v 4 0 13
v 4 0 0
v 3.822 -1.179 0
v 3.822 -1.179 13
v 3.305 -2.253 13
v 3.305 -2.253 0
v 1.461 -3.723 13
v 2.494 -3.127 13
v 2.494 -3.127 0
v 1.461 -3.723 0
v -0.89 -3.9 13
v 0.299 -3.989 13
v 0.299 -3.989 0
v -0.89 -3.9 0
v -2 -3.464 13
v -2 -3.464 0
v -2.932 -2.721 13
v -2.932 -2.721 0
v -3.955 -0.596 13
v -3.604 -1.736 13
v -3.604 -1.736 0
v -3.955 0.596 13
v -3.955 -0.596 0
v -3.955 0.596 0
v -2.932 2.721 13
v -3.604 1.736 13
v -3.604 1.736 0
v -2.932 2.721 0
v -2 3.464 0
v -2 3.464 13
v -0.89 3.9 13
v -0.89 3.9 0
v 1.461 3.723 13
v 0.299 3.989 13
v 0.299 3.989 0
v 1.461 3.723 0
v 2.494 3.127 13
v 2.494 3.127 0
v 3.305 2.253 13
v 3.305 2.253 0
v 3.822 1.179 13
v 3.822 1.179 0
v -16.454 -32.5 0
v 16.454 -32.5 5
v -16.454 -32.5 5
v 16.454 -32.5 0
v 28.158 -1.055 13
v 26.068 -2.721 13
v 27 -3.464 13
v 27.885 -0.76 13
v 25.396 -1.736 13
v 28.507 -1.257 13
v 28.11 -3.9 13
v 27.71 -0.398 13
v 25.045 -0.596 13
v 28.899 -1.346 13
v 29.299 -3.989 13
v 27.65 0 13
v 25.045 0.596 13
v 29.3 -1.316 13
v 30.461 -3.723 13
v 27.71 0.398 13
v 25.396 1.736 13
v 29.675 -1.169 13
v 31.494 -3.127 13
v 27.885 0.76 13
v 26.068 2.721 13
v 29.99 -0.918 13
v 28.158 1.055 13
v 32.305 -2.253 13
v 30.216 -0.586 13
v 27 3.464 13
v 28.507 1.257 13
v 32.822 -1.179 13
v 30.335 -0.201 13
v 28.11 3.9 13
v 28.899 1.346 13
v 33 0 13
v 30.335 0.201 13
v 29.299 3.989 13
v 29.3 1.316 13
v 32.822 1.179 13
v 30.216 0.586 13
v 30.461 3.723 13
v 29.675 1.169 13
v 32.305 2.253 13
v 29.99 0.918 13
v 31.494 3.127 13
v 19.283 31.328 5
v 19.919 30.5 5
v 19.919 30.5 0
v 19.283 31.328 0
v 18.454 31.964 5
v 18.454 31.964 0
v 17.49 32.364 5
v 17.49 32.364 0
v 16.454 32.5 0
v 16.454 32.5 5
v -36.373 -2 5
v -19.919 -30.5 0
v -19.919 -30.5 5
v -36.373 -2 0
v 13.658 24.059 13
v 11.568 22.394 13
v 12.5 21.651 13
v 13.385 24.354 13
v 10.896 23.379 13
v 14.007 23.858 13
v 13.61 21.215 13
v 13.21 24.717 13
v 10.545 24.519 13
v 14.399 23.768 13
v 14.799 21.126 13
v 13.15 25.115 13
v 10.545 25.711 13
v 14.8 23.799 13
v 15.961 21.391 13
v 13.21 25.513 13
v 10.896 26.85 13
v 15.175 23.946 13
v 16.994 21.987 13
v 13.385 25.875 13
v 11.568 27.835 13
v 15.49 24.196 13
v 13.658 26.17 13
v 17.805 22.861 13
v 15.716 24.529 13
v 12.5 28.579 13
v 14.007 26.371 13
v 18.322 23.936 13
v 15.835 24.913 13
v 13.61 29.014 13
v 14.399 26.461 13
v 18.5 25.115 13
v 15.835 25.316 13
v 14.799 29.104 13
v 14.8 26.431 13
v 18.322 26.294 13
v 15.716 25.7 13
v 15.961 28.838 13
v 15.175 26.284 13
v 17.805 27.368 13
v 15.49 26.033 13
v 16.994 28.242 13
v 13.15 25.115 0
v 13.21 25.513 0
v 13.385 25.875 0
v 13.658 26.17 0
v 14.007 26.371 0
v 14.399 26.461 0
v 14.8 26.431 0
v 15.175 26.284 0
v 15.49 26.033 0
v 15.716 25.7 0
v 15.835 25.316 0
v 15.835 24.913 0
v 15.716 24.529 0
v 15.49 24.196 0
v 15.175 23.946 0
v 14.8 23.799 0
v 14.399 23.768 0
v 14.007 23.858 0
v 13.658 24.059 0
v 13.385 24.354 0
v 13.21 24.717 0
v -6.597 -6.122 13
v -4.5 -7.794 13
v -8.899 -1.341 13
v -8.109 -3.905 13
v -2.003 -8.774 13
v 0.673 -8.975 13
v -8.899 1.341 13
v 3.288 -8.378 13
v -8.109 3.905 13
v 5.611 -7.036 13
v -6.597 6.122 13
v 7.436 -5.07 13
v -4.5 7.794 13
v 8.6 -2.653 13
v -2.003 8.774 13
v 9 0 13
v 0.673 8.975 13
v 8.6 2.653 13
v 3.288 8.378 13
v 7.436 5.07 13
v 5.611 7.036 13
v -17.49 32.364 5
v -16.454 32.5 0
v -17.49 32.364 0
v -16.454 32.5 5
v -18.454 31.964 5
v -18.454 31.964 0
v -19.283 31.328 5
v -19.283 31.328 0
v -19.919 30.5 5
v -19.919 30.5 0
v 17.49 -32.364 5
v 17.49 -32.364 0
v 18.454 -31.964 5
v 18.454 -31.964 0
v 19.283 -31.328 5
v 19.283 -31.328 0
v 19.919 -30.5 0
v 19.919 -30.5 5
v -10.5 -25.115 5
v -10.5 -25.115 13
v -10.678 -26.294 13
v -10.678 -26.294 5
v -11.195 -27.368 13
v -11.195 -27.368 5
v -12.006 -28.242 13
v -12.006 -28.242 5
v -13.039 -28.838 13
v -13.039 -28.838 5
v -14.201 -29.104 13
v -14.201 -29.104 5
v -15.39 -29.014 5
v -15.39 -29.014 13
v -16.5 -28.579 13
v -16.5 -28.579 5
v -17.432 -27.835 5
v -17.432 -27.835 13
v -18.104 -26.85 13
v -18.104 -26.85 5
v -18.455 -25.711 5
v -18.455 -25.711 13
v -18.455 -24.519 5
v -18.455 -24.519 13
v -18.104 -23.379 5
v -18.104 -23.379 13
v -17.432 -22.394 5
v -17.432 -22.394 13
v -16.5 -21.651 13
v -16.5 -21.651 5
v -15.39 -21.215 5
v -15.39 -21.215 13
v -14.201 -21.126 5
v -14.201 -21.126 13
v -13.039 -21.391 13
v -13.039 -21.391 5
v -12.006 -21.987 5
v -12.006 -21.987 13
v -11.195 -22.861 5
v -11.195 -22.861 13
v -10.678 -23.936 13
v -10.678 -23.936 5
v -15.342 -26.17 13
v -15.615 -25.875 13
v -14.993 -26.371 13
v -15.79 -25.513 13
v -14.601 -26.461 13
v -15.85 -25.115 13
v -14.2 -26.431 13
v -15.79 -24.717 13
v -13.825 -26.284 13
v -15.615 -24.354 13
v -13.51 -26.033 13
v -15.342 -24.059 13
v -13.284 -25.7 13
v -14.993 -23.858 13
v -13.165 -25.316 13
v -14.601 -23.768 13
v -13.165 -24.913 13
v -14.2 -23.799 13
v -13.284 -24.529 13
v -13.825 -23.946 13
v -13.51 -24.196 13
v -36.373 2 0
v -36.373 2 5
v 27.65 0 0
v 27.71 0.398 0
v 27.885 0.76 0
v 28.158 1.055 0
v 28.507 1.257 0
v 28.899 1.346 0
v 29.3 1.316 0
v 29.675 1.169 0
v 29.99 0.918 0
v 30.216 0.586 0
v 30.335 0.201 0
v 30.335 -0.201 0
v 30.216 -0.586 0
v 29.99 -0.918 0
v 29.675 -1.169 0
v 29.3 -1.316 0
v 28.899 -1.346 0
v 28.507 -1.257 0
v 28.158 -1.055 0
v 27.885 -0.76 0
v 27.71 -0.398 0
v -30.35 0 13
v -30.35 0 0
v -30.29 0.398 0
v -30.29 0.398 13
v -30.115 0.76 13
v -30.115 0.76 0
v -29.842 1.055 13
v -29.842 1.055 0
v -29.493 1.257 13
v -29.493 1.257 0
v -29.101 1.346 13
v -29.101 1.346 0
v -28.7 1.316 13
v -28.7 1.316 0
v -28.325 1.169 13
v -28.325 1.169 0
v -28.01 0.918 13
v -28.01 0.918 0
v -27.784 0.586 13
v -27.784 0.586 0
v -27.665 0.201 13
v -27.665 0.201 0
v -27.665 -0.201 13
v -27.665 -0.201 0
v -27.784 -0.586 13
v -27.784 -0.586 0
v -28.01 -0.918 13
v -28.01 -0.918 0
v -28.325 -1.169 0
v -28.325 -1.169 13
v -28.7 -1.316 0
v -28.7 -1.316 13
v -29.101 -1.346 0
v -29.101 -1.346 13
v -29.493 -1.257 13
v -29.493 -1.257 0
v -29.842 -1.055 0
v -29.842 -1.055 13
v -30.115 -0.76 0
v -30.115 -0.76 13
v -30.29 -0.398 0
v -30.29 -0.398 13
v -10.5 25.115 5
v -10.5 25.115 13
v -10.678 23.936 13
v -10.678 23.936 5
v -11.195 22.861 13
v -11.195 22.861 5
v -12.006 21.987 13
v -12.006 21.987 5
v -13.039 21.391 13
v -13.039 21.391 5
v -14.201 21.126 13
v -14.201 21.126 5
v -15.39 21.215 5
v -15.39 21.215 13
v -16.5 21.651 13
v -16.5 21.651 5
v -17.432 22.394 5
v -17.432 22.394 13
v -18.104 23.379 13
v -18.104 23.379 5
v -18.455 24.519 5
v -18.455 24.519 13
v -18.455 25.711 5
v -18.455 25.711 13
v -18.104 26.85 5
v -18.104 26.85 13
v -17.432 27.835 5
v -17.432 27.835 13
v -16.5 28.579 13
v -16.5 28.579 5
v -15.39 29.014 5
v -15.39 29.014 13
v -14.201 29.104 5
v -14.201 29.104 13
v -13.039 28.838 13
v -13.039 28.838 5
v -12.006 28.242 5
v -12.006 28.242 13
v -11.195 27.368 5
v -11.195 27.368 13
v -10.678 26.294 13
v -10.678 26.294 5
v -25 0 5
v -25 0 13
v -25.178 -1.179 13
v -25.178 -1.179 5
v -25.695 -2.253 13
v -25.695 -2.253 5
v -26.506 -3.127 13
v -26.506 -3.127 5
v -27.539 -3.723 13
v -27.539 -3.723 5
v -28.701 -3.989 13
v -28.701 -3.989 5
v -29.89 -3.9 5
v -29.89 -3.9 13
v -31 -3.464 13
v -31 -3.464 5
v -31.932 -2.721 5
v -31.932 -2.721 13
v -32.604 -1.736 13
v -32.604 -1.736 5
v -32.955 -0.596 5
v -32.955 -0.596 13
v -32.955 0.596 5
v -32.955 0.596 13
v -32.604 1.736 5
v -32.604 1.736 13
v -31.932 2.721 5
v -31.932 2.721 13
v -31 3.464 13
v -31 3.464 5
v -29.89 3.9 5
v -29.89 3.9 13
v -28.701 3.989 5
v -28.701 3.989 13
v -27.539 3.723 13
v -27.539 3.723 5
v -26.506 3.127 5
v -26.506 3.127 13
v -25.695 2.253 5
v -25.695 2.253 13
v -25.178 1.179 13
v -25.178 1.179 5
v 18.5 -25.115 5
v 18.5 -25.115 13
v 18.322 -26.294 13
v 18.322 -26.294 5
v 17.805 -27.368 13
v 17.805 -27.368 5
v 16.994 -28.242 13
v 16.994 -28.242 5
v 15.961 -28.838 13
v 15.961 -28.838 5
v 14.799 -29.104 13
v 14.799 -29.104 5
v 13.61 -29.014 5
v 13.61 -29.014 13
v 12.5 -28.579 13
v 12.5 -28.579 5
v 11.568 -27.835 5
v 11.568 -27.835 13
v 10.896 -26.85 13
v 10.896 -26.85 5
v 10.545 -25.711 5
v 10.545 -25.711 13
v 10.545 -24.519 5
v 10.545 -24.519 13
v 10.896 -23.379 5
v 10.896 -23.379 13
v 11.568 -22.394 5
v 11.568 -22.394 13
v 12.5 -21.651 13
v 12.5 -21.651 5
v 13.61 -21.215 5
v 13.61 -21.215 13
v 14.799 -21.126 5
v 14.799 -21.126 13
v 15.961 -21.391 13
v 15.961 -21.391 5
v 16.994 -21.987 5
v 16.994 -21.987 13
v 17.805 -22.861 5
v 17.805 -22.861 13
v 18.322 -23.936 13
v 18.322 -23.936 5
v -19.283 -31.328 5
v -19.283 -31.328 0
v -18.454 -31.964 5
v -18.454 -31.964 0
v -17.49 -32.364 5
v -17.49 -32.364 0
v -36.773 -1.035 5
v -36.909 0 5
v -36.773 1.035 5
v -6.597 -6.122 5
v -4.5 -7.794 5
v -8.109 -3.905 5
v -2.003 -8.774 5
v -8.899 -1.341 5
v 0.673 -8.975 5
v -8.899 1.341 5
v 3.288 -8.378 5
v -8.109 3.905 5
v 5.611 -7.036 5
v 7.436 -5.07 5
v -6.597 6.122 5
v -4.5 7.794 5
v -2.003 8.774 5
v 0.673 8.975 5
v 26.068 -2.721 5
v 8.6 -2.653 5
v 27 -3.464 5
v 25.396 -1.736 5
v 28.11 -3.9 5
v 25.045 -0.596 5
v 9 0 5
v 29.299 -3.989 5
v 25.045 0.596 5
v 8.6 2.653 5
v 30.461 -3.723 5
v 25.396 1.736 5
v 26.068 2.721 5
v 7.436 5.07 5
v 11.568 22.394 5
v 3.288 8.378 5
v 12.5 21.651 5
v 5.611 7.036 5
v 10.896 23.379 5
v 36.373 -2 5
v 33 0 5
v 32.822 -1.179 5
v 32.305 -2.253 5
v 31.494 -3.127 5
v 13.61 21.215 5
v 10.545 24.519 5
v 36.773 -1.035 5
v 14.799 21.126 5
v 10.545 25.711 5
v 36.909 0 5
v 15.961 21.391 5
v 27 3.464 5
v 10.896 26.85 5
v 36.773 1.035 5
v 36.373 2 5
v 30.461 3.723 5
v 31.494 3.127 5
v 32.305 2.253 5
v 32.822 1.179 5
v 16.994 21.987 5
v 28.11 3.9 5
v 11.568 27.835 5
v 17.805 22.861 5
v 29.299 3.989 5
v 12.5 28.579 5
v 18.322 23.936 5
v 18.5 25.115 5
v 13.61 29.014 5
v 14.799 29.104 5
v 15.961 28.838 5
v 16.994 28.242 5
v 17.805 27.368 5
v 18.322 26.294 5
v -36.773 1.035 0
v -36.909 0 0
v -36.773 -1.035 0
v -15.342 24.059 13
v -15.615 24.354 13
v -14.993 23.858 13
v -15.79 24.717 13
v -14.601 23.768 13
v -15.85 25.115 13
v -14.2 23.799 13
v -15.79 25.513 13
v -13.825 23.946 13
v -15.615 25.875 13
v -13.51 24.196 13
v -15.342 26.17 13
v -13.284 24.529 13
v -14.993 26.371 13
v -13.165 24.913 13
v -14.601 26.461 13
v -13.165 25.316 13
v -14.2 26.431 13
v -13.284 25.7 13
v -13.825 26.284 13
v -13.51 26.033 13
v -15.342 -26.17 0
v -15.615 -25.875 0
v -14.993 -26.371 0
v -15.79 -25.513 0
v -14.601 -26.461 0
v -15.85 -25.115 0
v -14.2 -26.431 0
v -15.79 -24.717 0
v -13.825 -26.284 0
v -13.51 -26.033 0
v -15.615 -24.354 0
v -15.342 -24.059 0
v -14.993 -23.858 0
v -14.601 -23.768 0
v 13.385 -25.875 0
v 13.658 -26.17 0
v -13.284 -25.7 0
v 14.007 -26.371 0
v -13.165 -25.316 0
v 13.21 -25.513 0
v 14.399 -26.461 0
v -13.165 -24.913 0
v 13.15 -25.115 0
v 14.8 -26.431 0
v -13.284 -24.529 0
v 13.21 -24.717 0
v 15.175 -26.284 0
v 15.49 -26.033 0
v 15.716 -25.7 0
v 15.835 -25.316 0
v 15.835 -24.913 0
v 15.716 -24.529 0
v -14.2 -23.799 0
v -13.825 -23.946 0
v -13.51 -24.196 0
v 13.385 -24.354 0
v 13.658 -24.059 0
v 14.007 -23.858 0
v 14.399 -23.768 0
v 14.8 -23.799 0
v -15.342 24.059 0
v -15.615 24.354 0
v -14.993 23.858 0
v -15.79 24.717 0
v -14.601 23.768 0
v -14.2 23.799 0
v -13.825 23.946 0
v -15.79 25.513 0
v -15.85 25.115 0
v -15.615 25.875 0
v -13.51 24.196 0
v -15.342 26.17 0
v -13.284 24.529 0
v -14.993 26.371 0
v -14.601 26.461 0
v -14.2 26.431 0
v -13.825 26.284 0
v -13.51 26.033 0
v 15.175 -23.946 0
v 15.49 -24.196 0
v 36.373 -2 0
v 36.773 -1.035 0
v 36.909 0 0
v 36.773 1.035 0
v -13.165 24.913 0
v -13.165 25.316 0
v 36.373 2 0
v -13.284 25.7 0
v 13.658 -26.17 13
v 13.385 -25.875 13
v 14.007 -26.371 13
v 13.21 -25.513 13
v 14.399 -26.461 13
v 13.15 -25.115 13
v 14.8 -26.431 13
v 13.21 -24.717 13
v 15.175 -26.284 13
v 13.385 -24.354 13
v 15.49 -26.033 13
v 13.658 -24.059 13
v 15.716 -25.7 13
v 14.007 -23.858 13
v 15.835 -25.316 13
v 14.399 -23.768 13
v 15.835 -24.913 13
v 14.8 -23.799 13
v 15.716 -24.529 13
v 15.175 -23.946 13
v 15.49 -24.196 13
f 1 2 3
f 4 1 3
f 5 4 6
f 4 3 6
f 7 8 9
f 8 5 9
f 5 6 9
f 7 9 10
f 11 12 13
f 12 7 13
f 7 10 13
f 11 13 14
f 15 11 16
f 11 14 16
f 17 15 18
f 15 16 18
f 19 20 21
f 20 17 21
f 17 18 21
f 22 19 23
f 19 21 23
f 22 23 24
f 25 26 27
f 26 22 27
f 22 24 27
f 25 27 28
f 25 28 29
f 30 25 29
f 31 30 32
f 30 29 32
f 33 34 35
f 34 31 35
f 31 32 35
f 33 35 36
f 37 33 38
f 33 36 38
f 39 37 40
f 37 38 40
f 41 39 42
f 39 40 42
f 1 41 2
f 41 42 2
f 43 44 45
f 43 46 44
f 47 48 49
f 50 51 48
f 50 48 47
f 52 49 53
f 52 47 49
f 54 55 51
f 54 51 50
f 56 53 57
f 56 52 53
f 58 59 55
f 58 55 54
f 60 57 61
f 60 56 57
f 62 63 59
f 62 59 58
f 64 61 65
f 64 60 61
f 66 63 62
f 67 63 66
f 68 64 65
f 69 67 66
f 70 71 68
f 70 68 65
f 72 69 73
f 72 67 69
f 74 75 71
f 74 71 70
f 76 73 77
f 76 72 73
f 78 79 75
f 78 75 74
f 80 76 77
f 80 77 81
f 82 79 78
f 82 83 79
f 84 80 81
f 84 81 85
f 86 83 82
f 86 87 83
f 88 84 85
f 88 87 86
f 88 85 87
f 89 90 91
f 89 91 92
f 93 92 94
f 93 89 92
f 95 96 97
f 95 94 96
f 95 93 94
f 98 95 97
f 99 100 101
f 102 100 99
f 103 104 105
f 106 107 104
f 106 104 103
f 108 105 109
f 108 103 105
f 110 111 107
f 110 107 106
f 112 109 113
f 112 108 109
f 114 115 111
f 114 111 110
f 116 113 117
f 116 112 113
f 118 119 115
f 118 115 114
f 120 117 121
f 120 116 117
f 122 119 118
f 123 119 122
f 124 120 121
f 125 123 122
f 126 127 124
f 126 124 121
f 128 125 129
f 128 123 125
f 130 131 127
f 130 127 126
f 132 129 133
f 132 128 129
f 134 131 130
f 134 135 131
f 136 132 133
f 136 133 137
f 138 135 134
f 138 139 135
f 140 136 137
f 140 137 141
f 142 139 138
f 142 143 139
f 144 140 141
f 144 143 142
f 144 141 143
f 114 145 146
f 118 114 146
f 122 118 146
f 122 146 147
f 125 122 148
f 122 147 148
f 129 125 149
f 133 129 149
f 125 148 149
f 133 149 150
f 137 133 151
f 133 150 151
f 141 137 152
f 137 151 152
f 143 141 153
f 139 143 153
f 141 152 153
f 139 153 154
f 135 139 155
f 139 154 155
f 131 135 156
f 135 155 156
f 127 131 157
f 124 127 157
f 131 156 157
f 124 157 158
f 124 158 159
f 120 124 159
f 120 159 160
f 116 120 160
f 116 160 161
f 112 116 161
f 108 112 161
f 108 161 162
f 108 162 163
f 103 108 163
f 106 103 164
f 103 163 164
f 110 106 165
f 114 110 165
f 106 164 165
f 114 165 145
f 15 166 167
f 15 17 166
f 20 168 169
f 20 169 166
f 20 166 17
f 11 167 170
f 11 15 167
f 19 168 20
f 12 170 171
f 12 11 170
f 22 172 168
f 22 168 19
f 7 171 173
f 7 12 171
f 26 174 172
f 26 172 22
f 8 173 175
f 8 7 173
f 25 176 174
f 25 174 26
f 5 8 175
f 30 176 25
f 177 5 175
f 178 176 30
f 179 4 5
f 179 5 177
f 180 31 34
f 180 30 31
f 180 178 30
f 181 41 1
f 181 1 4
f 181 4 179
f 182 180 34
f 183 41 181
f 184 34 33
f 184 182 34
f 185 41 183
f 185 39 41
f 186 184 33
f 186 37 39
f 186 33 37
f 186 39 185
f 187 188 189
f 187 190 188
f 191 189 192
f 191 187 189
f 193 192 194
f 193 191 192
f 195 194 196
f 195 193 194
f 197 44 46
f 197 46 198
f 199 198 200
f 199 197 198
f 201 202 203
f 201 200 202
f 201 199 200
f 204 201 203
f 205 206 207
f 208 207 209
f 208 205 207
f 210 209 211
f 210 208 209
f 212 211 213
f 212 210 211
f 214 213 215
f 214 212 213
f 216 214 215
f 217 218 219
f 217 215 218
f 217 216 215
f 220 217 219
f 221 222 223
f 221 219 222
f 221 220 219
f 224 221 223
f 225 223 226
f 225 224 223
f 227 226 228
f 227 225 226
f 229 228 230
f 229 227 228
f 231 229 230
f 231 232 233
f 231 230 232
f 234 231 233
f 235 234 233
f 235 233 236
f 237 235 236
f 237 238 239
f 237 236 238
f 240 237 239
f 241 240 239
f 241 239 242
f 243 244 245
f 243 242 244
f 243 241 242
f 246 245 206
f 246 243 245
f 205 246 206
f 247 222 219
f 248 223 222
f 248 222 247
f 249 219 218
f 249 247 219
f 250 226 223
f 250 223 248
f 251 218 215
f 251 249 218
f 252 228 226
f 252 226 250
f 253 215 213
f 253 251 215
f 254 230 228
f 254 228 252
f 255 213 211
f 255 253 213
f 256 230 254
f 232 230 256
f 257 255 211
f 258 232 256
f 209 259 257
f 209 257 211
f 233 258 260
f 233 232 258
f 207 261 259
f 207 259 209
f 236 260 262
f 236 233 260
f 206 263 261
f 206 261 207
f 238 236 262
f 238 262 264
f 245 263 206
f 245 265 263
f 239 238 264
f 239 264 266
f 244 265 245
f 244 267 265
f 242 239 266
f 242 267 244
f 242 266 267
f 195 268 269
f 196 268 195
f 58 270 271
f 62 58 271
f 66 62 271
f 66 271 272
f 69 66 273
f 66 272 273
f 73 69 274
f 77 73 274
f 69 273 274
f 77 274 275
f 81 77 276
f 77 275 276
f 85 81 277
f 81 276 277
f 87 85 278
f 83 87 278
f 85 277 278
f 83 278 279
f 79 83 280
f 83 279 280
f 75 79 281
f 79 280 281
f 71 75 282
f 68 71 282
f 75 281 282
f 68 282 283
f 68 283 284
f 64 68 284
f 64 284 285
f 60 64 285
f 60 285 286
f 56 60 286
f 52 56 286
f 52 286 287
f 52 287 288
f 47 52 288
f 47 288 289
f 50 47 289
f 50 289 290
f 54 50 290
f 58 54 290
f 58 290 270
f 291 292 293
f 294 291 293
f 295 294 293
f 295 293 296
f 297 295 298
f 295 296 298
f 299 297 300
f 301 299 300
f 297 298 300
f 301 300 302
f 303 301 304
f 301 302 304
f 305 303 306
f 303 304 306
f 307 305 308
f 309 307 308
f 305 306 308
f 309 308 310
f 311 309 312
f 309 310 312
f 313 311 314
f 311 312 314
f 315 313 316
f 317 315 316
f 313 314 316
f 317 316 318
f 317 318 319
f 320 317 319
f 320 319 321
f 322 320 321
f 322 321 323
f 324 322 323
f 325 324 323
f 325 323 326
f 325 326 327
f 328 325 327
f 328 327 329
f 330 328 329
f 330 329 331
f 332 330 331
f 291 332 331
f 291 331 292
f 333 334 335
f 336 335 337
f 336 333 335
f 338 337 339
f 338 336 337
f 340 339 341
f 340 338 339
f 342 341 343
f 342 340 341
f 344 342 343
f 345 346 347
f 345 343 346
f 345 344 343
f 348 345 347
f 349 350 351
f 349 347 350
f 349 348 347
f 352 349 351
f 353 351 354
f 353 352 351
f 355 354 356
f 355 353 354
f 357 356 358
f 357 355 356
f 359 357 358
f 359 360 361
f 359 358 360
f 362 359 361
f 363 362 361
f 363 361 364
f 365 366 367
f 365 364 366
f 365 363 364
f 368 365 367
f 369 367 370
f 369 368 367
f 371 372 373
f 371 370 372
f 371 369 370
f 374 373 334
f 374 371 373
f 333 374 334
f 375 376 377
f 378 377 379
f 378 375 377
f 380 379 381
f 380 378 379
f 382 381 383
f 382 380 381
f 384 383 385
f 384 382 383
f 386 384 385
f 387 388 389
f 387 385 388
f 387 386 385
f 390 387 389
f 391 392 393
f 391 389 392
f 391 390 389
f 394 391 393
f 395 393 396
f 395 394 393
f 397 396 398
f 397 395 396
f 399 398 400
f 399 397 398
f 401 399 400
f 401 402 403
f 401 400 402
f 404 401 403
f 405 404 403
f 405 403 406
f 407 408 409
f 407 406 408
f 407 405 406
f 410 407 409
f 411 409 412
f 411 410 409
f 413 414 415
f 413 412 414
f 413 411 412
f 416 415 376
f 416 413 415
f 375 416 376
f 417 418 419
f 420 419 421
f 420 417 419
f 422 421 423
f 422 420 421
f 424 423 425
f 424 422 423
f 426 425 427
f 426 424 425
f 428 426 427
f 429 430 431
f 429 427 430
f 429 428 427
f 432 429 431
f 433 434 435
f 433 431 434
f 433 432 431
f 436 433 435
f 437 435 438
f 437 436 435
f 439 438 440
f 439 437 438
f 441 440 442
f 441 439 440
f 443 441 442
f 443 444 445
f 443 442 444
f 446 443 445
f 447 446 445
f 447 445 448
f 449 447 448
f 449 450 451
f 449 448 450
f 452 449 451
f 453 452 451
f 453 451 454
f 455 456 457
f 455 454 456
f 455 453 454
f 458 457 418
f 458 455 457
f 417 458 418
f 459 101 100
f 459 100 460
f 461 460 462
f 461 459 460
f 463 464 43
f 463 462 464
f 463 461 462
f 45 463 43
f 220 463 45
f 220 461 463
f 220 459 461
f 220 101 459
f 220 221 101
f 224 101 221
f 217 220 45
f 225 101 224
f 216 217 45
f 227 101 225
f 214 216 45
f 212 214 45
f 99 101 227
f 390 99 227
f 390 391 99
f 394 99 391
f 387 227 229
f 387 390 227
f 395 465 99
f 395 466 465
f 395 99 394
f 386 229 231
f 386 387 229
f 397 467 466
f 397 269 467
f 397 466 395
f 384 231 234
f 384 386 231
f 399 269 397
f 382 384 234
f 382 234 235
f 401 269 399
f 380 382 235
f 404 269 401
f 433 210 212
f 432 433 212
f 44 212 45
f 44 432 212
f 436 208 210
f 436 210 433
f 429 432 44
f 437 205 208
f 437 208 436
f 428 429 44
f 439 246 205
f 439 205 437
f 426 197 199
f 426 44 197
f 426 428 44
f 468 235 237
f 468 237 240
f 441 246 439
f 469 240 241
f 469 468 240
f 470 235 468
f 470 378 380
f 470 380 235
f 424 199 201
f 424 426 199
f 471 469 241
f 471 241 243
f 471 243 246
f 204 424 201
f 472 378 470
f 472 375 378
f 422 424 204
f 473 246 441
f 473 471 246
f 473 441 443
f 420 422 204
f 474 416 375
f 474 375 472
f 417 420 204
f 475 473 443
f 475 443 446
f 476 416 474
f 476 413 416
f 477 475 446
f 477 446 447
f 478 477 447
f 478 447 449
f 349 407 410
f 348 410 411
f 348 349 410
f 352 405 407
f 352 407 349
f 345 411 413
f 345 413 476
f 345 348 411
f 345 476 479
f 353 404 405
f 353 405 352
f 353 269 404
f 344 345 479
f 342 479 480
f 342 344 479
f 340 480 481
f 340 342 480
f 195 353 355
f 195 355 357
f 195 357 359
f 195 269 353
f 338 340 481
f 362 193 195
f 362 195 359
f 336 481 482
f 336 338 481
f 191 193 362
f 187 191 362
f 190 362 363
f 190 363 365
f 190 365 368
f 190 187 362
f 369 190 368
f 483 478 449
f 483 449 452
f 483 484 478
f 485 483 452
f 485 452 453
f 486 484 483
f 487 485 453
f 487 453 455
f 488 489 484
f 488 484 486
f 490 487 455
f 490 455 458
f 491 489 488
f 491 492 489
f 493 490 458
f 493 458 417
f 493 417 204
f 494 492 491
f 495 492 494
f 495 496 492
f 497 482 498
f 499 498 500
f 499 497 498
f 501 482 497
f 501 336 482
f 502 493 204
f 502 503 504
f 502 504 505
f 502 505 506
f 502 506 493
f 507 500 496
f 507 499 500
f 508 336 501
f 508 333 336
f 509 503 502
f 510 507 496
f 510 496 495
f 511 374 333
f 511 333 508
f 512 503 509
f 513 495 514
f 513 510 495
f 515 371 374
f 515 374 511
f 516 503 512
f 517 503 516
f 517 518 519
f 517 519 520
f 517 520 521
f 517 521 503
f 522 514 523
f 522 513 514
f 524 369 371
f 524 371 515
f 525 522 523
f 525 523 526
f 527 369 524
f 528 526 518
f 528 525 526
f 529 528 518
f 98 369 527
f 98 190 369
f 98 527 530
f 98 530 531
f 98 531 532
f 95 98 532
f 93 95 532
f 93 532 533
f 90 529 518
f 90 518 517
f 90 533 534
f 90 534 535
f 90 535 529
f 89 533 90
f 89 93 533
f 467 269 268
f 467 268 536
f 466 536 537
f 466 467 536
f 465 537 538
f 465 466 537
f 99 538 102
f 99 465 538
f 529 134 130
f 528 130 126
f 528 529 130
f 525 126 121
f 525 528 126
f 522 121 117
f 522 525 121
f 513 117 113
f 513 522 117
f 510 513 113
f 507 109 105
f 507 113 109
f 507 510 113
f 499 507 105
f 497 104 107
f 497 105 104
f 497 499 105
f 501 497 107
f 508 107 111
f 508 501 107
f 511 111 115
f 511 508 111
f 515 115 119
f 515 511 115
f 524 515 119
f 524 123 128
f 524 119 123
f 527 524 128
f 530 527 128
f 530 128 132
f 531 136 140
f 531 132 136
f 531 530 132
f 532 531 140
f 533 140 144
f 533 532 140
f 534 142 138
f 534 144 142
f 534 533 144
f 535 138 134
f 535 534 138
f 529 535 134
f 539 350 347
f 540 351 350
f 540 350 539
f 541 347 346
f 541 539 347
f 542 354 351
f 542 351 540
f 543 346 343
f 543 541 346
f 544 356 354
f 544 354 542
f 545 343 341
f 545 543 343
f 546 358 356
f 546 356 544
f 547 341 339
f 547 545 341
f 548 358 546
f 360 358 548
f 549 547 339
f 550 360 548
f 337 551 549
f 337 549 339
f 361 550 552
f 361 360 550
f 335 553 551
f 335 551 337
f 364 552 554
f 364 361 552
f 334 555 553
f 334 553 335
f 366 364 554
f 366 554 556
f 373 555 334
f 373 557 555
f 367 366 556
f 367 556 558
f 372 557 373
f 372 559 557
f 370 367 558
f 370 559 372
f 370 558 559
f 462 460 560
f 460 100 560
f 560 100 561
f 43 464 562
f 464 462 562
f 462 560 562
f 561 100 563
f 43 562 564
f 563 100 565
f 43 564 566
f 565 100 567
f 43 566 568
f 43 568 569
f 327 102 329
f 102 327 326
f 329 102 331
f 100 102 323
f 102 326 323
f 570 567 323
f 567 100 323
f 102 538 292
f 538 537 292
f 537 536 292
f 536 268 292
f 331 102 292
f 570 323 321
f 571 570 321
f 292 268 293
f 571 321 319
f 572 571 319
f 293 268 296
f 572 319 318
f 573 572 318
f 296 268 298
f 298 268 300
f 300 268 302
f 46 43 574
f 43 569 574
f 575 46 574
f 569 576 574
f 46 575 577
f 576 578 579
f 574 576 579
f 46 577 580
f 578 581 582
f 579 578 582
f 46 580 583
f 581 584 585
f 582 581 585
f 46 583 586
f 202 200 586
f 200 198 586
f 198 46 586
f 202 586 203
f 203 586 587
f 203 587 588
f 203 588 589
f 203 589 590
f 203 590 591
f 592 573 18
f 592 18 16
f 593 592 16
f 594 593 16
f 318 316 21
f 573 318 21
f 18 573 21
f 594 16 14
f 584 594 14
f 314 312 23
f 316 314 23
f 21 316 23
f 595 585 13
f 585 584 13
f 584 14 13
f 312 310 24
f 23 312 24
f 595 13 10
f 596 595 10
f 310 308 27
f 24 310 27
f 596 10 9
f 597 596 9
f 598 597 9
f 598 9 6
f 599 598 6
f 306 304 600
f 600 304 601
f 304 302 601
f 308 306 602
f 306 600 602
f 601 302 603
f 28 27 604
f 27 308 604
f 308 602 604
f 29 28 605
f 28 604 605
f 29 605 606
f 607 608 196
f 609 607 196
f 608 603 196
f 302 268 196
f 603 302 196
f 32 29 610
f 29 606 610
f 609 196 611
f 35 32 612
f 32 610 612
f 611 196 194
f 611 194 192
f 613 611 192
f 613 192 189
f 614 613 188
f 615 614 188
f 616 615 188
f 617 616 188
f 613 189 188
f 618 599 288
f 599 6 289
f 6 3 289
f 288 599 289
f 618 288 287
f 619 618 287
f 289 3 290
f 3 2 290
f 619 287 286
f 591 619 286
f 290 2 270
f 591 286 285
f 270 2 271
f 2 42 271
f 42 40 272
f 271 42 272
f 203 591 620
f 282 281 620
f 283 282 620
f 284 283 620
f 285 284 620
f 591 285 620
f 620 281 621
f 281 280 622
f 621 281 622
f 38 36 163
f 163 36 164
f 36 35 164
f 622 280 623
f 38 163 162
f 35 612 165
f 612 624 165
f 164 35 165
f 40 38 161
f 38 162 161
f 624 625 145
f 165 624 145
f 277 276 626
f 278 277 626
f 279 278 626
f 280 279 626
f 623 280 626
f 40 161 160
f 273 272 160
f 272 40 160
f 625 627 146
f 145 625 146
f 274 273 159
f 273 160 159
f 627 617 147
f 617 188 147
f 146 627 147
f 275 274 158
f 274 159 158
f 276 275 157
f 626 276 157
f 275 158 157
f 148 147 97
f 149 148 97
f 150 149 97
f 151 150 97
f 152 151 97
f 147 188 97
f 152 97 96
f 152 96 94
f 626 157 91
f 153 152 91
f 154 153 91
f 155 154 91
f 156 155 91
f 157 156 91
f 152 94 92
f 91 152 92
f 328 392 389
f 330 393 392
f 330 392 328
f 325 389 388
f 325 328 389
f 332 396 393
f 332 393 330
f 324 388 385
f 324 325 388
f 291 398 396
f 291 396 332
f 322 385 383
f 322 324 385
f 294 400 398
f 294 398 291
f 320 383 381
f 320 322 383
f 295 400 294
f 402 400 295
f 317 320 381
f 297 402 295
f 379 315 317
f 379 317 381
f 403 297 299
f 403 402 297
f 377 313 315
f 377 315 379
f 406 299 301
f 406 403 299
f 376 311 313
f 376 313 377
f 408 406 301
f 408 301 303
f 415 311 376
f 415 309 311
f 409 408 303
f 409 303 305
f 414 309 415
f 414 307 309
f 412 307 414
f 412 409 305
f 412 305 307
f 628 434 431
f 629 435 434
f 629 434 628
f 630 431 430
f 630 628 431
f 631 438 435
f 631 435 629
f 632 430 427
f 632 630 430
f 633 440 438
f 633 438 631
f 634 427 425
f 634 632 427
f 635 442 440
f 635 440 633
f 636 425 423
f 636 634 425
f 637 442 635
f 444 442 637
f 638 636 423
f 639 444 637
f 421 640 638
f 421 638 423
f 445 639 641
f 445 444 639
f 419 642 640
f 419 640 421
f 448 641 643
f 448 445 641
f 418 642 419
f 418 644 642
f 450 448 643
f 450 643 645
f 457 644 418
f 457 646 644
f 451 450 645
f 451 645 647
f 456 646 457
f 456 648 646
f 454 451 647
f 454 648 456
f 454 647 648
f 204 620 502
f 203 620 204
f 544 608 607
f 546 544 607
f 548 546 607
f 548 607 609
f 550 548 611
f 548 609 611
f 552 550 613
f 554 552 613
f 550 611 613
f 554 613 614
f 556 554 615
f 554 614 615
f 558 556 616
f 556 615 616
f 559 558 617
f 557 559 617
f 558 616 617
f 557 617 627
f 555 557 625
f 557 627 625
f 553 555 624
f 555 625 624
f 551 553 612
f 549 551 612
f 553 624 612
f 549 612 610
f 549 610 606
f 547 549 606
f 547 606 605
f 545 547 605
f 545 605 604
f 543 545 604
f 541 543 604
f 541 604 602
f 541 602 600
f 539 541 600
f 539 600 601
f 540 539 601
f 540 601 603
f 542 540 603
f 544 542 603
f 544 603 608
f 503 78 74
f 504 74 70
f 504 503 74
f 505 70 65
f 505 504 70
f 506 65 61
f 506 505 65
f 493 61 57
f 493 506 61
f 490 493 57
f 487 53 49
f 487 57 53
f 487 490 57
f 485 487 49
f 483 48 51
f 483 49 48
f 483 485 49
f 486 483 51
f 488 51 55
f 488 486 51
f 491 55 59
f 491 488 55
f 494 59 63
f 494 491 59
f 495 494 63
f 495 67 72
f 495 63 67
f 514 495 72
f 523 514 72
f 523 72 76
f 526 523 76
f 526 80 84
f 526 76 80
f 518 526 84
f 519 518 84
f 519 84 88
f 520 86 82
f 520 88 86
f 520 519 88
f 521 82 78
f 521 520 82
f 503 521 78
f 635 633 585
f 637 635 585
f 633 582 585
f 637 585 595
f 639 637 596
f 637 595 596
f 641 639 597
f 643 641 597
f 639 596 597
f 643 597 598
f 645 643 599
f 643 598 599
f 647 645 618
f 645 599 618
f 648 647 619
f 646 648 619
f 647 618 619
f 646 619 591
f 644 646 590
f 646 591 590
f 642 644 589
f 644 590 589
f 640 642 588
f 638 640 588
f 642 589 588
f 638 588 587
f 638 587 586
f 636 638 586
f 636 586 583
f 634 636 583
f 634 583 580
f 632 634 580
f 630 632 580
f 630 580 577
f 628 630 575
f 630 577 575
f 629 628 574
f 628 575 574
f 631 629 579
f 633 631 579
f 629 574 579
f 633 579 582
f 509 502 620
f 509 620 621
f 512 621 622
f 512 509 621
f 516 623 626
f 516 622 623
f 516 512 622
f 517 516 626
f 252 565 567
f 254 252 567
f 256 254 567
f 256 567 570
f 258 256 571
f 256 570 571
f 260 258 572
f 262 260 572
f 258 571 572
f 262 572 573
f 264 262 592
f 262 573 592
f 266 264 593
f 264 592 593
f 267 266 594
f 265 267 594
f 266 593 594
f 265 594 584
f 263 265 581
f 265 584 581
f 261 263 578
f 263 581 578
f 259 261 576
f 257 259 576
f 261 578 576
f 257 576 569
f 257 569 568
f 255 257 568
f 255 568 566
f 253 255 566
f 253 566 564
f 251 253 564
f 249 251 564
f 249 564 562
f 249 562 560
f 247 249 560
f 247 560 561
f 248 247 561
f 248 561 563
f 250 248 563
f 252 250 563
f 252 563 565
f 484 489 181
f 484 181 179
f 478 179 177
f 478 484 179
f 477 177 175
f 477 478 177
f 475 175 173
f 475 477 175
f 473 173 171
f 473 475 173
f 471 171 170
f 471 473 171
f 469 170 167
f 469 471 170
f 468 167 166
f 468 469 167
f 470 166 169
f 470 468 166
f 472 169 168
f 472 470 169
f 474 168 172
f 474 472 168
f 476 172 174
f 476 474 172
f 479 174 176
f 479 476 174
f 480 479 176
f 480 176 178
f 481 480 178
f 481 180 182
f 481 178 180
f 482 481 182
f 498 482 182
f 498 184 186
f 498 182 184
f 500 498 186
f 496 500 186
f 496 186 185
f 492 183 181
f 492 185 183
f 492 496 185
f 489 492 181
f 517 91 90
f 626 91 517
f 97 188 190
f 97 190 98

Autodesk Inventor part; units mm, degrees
ref_plane "YZ Plane" through (0, 0, 0) normal (1, 0, 0) x (0, 1, 0)
ref_plane "XZ Plane" through (0, 0, 0) normal (0, 1, 0) x (-1, 0, 0)
ref_plane "XY Plane" through (0, 0, 0) normal (0, 0, 1) x (1, 0, 0)
sketch "Sketch1" plane through (0, 0, 0) normal (0, 0, 1) x (1, 0, 0)
  line L0 (-14.5, 25.1147) -> (14.5, 25.1147) construction
  line L1 (14.5, 25.1147) -> (29, 0) construction
  line L2 (29, 0) -> (14.5, -25.1147) construction
  line L3 (14.5, -25.1147) -> (-14.5, -25.1147) construction
  line L4 (-14.5, -25.1147) -> (-29, 0) construction
  line L5 (-29, 0) -> (-14.5, 25.1147) construction
  line L6 (-18.7639, 32.5) -> (18.7639, 32.5)
  line L7 (18.7639, 32.5) -> (37.5278, 0)
  line L8 (37.5278, 0) -> (18.7639, -32.5)
  line L9 (18.7639, -32.5) -> (-18.7639, -32.5)
  line L10 (-18.7639, -32.5) -> (-37.5278, 0)
  line L11 (-37.5278, 0) -> (-18.7639, 32.5)
  circle A0 centre (-14.5, 25.1147) radius 11 construction
  circle A1 centre (14.5, 25.1147) radius 11 construction
  circle A2 centre (29, 0) radius 11 construction
  circle A3 centre (14.5, -25.1147) radius 11 construction
  circle A4 centre (-14.5, -25.1147) radius 11 construction
  circle A5 centre (-29, 0) radius 11 construction
  circle A6 centre (-14.5, 25.1147) radius 4
  circle A7 centre (14.5, 25.1147) radius 4
  circle A8 centre (29, 0) radius 4
  circle A9 centre (14.5, -25.1147) radius 4
  circle A10 centre (-14.5, -25.1147) radius 4
  circle A11 centre (-29, 0) radius 4
  circle A12 centre (0, 0) radius 4
  circle A13 centre (0, 0) radius 40 construction
  circle A14 centre (0, 0) radius 37.5278 construction
  dimension "d17" = 75.0555
  dimension "d0" = 22
  dimension "d1" = 50.2295
  dimension "d2" = 8
  dimension "d3" = 65
  dimension "d4" = 8
  dimension "d13" = 80
extrude "Extrusion1" add sketch "Sketch1" along normal blind 5
fillet "Fillet1" radius 4 6 edges at (37.5278, 0, 2.5) (18.7639, -32.5, 2.5) (-18.7639, -32.5, 2.5) (-37.5278, 0, 2.5) (-18.7639, 32.5, 2.5) (18.7639, 32.5, 2.5)
sketch "Sketch2" plane through (0, 0, 5) normal (0, 0, 1) x (1, 0, 0)
  arc A0 (19.9186, 30.5) -> (16.4545, 32.5) centre (16.4545, 28.5) ccw projected
  line L0 (16.4545, 32.5) -> (-16.4545, 32.5) projected
  arc A1 (-16.4545, 32.5) -> (-19.9186, 30.5) centre (-16.4545, 28.5) ccw projected
  line L1 (-19.9186, 30.5) -> (-36.3731, 2) projected
  arc A2 (-36.3731, 2) -> (-36.3731, -2) centre (-32.909, 0) ccw projected
  line L2 (-36.3731, -2) -> (-19.9186, -30.5) projected
  arc A3 (-19.9186, -30.5) -> (-16.4545, -32.5) centre (-16.4545, -28.5) ccw projected
  line L3 (-16.4545, -32.5) -> (16.4545, -32.5) projected
  arc A4 (16.4545, -32.5) -> (19.9186, -30.5) centre (16.4545, -28.5) ccw projected
  line L4 (19.9186, -30.5) -> (36.3731, -2) projected
  arc A5 (36.3731, -2) -> (36.3731, 2) centre (32.909, 0) ccw projected
  line L5 (36.3731, 2) -> (19.9186, 30.5) projected
  circle A6 centre (0, 0) radius 4 projected
  circle A7 centre (-29, 0) radius 4 projected
  circle A8 centre (-14.5, -25.1147) radius 4 projected
  circle A9 centre (14.5, -25.1147) radius 4 projected
  circle A10 centre (29, 0) radius 4 projected
  circle A11 centre (14.5, 25.1147) radius 4 projected
  circle A12 centre (-14.5, 25.1147) radius 4 projected
  circle A13 centre (0, 0) radius 4 projected
  circle A14 centre (0, 0) radius 9
  dimension "d8" = 5
extrude "Extrusion2" add sketch "Sketch2" along normal blind 8 contours A7 | A8 | A9 | A10 | A11 | A12 | A14
sketch "Sketch3" plane through (0, 0, 0) normal (0, 0, -1) x (-1, 0, 0)
  circle A0 centre (0, 0) radius 4 projected
  circle A1 centre (29, 0) radius 4 projected
  circle A2 centre (14.5, -25.1147) radius 4 projected
  circle A3 centre (-14.5, -25.1147) radius 4 projected
  circle A4 centre (-29, 0) radius 4 projected
  circle A5 centre (-14.5, 25.1147) radius 4 projected
  circle A6 centre (14.5, 25.1147) radius 4 projected
  arc A7 (-16.4545, 32.5) -> (-19.9186, 30.5) centre (-16.4545, 28.5) ccw projected
  line L0 (-19.9186, 30.5) -> (-36.3731, 2) projected
  arc A8 (-36.3731, 2) -> (-36.3731, -2) centre (-32.909, 0) ccw projected
  line L1 (-36.3731, -2) -> (-19.9186, -30.5) projected
  arc A9 (-19.9186, -30.5) -> (-16.4545, -32.5) centre (-16.4545, -28.5) ccw projected
  line L2 (-16.4545, -32.5) -> (16.4545, -32.5) projected
  arc A10 (16.4545, -32.5) -> (19.9186, -30.5) centre (16.4545, -28.5) ccw projected
  line L3 (19.9186, -30.5) -> (36.3731, -2) projected
  arc A11 (36.3731, -2) -> (36.3731, 2) centre (32.909, 0) ccw projected
  line L4 (36.3731, 2) -> (19.9186, 30.5) projected
  arc A12 (19.9186, 30.5) -> (16.4545, 32.5) centre (16.4545, 28.5) ccw projected
  line L5 (16.4545, 32.5) -> (-16.4545, 32.5) projected
extrude "Extrusion3" add sketch "Sketch3" against normal up to next contours A1 | A2 | A3 | A4 | A5 | A6
sketch "Sketch4" plane through (0, 0, 0) normal (0, 0, -1) x (-1, 0, 0)
  circle A0 centre (-14.5, 25.1147) radius 4 construction
  circle A1 centre (14.5, 25.1147) radius 4 construction
  circle A2 centre (29, 0) radius 4 construction
  circle A3 centre (14.5, -25.1147) radius 4 construction
  circle A4 centre (-14.5, -25.1147) radius 4 construction
  circle A5 centre (-29, 0) radius 4 construction
  circle A6 centre (-14.5, 25.1147) radius 1.35
  circle A7 centre (14.5, 25.1147) radius 1.35
  circle A8 centre (29, 0) radius 1.35
  circle A9 centre (14.5, -25.1147) radius 1.35
  circle A10 centre (-14.5, -25.1147) radius 1.35
  circle A11 centre (-29, 0) radius 1.35
  point P0 (0, 0)
  dimension "d14" = 2.7
extrude "Extrusion4" cut sketch "Sketch4" against normal through all
properties part number "rotor 2"
